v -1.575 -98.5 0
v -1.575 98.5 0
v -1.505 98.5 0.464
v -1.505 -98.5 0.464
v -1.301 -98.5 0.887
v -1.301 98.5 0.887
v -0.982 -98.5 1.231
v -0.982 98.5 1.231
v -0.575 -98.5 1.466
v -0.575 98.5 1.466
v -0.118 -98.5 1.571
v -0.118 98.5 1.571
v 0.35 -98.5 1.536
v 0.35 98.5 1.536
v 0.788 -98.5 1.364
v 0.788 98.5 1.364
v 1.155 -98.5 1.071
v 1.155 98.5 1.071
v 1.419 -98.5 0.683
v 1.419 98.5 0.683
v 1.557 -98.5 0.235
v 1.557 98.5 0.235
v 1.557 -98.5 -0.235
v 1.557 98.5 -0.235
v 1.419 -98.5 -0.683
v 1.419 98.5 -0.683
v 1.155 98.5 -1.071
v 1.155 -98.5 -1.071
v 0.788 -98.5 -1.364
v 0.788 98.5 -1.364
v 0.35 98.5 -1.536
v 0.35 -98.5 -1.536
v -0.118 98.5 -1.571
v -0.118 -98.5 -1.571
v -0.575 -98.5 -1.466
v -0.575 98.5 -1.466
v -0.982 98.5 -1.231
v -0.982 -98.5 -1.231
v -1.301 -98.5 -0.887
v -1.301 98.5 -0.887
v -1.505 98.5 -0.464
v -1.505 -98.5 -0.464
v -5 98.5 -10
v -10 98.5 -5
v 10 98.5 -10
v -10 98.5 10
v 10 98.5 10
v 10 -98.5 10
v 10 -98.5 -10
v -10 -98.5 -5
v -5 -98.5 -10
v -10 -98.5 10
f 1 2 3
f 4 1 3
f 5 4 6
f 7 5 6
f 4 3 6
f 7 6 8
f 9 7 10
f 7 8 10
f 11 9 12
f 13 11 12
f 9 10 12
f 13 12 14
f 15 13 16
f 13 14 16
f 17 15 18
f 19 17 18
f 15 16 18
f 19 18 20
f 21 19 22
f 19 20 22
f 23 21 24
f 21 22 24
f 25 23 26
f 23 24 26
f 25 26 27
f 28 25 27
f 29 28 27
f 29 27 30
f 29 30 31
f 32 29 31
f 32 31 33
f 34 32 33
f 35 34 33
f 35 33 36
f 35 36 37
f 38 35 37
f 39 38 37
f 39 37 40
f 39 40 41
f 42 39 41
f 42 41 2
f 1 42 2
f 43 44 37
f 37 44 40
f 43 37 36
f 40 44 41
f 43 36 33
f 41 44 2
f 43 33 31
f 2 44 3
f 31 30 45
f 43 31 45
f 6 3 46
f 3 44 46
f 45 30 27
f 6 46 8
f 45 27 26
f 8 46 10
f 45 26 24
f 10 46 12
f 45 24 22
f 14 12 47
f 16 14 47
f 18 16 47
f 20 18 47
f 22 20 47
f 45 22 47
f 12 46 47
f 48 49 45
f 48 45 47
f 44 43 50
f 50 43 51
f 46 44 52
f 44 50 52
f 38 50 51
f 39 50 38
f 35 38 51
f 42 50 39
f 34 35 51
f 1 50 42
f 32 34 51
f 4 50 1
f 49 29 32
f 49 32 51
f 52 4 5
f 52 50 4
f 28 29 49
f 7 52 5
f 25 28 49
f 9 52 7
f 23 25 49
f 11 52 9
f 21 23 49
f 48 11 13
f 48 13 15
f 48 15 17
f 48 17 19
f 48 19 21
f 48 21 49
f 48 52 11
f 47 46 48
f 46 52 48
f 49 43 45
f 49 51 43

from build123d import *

# Parameters (mm, degrees)
F0_W          = 20
F0_H          = 20
F1_DEPTH      = 98.5
F1_DEPTH_BACK = 98.5
F2_SIZE       = 5
F4_D          = 3.15


with BuildPart() as f1:
    # F0 (on Front) → F1 (new body, two sides)
    with BuildSketch(Plane.XZ) as f1_sk:
        Rectangle(F0_W, F0_H)
    extrude(amount=F1_DEPTH)
    extrude(f1_sk.sketch, amount=-F1_DEPTH_BACK)

    # F2
    f2_edges = [f1.edges().sort_by_distance(p)[0] for p in [
        (-10, 0, -10),
    ]]
    chamfer(f2_edges, length=F2_SIZE)

    # F4 (through all)
    with Locations(Plane.XZ.offset(98.5)):
        with Locations((0, 0)):
            Hole(F4_D / 2)


solid = f1.part
